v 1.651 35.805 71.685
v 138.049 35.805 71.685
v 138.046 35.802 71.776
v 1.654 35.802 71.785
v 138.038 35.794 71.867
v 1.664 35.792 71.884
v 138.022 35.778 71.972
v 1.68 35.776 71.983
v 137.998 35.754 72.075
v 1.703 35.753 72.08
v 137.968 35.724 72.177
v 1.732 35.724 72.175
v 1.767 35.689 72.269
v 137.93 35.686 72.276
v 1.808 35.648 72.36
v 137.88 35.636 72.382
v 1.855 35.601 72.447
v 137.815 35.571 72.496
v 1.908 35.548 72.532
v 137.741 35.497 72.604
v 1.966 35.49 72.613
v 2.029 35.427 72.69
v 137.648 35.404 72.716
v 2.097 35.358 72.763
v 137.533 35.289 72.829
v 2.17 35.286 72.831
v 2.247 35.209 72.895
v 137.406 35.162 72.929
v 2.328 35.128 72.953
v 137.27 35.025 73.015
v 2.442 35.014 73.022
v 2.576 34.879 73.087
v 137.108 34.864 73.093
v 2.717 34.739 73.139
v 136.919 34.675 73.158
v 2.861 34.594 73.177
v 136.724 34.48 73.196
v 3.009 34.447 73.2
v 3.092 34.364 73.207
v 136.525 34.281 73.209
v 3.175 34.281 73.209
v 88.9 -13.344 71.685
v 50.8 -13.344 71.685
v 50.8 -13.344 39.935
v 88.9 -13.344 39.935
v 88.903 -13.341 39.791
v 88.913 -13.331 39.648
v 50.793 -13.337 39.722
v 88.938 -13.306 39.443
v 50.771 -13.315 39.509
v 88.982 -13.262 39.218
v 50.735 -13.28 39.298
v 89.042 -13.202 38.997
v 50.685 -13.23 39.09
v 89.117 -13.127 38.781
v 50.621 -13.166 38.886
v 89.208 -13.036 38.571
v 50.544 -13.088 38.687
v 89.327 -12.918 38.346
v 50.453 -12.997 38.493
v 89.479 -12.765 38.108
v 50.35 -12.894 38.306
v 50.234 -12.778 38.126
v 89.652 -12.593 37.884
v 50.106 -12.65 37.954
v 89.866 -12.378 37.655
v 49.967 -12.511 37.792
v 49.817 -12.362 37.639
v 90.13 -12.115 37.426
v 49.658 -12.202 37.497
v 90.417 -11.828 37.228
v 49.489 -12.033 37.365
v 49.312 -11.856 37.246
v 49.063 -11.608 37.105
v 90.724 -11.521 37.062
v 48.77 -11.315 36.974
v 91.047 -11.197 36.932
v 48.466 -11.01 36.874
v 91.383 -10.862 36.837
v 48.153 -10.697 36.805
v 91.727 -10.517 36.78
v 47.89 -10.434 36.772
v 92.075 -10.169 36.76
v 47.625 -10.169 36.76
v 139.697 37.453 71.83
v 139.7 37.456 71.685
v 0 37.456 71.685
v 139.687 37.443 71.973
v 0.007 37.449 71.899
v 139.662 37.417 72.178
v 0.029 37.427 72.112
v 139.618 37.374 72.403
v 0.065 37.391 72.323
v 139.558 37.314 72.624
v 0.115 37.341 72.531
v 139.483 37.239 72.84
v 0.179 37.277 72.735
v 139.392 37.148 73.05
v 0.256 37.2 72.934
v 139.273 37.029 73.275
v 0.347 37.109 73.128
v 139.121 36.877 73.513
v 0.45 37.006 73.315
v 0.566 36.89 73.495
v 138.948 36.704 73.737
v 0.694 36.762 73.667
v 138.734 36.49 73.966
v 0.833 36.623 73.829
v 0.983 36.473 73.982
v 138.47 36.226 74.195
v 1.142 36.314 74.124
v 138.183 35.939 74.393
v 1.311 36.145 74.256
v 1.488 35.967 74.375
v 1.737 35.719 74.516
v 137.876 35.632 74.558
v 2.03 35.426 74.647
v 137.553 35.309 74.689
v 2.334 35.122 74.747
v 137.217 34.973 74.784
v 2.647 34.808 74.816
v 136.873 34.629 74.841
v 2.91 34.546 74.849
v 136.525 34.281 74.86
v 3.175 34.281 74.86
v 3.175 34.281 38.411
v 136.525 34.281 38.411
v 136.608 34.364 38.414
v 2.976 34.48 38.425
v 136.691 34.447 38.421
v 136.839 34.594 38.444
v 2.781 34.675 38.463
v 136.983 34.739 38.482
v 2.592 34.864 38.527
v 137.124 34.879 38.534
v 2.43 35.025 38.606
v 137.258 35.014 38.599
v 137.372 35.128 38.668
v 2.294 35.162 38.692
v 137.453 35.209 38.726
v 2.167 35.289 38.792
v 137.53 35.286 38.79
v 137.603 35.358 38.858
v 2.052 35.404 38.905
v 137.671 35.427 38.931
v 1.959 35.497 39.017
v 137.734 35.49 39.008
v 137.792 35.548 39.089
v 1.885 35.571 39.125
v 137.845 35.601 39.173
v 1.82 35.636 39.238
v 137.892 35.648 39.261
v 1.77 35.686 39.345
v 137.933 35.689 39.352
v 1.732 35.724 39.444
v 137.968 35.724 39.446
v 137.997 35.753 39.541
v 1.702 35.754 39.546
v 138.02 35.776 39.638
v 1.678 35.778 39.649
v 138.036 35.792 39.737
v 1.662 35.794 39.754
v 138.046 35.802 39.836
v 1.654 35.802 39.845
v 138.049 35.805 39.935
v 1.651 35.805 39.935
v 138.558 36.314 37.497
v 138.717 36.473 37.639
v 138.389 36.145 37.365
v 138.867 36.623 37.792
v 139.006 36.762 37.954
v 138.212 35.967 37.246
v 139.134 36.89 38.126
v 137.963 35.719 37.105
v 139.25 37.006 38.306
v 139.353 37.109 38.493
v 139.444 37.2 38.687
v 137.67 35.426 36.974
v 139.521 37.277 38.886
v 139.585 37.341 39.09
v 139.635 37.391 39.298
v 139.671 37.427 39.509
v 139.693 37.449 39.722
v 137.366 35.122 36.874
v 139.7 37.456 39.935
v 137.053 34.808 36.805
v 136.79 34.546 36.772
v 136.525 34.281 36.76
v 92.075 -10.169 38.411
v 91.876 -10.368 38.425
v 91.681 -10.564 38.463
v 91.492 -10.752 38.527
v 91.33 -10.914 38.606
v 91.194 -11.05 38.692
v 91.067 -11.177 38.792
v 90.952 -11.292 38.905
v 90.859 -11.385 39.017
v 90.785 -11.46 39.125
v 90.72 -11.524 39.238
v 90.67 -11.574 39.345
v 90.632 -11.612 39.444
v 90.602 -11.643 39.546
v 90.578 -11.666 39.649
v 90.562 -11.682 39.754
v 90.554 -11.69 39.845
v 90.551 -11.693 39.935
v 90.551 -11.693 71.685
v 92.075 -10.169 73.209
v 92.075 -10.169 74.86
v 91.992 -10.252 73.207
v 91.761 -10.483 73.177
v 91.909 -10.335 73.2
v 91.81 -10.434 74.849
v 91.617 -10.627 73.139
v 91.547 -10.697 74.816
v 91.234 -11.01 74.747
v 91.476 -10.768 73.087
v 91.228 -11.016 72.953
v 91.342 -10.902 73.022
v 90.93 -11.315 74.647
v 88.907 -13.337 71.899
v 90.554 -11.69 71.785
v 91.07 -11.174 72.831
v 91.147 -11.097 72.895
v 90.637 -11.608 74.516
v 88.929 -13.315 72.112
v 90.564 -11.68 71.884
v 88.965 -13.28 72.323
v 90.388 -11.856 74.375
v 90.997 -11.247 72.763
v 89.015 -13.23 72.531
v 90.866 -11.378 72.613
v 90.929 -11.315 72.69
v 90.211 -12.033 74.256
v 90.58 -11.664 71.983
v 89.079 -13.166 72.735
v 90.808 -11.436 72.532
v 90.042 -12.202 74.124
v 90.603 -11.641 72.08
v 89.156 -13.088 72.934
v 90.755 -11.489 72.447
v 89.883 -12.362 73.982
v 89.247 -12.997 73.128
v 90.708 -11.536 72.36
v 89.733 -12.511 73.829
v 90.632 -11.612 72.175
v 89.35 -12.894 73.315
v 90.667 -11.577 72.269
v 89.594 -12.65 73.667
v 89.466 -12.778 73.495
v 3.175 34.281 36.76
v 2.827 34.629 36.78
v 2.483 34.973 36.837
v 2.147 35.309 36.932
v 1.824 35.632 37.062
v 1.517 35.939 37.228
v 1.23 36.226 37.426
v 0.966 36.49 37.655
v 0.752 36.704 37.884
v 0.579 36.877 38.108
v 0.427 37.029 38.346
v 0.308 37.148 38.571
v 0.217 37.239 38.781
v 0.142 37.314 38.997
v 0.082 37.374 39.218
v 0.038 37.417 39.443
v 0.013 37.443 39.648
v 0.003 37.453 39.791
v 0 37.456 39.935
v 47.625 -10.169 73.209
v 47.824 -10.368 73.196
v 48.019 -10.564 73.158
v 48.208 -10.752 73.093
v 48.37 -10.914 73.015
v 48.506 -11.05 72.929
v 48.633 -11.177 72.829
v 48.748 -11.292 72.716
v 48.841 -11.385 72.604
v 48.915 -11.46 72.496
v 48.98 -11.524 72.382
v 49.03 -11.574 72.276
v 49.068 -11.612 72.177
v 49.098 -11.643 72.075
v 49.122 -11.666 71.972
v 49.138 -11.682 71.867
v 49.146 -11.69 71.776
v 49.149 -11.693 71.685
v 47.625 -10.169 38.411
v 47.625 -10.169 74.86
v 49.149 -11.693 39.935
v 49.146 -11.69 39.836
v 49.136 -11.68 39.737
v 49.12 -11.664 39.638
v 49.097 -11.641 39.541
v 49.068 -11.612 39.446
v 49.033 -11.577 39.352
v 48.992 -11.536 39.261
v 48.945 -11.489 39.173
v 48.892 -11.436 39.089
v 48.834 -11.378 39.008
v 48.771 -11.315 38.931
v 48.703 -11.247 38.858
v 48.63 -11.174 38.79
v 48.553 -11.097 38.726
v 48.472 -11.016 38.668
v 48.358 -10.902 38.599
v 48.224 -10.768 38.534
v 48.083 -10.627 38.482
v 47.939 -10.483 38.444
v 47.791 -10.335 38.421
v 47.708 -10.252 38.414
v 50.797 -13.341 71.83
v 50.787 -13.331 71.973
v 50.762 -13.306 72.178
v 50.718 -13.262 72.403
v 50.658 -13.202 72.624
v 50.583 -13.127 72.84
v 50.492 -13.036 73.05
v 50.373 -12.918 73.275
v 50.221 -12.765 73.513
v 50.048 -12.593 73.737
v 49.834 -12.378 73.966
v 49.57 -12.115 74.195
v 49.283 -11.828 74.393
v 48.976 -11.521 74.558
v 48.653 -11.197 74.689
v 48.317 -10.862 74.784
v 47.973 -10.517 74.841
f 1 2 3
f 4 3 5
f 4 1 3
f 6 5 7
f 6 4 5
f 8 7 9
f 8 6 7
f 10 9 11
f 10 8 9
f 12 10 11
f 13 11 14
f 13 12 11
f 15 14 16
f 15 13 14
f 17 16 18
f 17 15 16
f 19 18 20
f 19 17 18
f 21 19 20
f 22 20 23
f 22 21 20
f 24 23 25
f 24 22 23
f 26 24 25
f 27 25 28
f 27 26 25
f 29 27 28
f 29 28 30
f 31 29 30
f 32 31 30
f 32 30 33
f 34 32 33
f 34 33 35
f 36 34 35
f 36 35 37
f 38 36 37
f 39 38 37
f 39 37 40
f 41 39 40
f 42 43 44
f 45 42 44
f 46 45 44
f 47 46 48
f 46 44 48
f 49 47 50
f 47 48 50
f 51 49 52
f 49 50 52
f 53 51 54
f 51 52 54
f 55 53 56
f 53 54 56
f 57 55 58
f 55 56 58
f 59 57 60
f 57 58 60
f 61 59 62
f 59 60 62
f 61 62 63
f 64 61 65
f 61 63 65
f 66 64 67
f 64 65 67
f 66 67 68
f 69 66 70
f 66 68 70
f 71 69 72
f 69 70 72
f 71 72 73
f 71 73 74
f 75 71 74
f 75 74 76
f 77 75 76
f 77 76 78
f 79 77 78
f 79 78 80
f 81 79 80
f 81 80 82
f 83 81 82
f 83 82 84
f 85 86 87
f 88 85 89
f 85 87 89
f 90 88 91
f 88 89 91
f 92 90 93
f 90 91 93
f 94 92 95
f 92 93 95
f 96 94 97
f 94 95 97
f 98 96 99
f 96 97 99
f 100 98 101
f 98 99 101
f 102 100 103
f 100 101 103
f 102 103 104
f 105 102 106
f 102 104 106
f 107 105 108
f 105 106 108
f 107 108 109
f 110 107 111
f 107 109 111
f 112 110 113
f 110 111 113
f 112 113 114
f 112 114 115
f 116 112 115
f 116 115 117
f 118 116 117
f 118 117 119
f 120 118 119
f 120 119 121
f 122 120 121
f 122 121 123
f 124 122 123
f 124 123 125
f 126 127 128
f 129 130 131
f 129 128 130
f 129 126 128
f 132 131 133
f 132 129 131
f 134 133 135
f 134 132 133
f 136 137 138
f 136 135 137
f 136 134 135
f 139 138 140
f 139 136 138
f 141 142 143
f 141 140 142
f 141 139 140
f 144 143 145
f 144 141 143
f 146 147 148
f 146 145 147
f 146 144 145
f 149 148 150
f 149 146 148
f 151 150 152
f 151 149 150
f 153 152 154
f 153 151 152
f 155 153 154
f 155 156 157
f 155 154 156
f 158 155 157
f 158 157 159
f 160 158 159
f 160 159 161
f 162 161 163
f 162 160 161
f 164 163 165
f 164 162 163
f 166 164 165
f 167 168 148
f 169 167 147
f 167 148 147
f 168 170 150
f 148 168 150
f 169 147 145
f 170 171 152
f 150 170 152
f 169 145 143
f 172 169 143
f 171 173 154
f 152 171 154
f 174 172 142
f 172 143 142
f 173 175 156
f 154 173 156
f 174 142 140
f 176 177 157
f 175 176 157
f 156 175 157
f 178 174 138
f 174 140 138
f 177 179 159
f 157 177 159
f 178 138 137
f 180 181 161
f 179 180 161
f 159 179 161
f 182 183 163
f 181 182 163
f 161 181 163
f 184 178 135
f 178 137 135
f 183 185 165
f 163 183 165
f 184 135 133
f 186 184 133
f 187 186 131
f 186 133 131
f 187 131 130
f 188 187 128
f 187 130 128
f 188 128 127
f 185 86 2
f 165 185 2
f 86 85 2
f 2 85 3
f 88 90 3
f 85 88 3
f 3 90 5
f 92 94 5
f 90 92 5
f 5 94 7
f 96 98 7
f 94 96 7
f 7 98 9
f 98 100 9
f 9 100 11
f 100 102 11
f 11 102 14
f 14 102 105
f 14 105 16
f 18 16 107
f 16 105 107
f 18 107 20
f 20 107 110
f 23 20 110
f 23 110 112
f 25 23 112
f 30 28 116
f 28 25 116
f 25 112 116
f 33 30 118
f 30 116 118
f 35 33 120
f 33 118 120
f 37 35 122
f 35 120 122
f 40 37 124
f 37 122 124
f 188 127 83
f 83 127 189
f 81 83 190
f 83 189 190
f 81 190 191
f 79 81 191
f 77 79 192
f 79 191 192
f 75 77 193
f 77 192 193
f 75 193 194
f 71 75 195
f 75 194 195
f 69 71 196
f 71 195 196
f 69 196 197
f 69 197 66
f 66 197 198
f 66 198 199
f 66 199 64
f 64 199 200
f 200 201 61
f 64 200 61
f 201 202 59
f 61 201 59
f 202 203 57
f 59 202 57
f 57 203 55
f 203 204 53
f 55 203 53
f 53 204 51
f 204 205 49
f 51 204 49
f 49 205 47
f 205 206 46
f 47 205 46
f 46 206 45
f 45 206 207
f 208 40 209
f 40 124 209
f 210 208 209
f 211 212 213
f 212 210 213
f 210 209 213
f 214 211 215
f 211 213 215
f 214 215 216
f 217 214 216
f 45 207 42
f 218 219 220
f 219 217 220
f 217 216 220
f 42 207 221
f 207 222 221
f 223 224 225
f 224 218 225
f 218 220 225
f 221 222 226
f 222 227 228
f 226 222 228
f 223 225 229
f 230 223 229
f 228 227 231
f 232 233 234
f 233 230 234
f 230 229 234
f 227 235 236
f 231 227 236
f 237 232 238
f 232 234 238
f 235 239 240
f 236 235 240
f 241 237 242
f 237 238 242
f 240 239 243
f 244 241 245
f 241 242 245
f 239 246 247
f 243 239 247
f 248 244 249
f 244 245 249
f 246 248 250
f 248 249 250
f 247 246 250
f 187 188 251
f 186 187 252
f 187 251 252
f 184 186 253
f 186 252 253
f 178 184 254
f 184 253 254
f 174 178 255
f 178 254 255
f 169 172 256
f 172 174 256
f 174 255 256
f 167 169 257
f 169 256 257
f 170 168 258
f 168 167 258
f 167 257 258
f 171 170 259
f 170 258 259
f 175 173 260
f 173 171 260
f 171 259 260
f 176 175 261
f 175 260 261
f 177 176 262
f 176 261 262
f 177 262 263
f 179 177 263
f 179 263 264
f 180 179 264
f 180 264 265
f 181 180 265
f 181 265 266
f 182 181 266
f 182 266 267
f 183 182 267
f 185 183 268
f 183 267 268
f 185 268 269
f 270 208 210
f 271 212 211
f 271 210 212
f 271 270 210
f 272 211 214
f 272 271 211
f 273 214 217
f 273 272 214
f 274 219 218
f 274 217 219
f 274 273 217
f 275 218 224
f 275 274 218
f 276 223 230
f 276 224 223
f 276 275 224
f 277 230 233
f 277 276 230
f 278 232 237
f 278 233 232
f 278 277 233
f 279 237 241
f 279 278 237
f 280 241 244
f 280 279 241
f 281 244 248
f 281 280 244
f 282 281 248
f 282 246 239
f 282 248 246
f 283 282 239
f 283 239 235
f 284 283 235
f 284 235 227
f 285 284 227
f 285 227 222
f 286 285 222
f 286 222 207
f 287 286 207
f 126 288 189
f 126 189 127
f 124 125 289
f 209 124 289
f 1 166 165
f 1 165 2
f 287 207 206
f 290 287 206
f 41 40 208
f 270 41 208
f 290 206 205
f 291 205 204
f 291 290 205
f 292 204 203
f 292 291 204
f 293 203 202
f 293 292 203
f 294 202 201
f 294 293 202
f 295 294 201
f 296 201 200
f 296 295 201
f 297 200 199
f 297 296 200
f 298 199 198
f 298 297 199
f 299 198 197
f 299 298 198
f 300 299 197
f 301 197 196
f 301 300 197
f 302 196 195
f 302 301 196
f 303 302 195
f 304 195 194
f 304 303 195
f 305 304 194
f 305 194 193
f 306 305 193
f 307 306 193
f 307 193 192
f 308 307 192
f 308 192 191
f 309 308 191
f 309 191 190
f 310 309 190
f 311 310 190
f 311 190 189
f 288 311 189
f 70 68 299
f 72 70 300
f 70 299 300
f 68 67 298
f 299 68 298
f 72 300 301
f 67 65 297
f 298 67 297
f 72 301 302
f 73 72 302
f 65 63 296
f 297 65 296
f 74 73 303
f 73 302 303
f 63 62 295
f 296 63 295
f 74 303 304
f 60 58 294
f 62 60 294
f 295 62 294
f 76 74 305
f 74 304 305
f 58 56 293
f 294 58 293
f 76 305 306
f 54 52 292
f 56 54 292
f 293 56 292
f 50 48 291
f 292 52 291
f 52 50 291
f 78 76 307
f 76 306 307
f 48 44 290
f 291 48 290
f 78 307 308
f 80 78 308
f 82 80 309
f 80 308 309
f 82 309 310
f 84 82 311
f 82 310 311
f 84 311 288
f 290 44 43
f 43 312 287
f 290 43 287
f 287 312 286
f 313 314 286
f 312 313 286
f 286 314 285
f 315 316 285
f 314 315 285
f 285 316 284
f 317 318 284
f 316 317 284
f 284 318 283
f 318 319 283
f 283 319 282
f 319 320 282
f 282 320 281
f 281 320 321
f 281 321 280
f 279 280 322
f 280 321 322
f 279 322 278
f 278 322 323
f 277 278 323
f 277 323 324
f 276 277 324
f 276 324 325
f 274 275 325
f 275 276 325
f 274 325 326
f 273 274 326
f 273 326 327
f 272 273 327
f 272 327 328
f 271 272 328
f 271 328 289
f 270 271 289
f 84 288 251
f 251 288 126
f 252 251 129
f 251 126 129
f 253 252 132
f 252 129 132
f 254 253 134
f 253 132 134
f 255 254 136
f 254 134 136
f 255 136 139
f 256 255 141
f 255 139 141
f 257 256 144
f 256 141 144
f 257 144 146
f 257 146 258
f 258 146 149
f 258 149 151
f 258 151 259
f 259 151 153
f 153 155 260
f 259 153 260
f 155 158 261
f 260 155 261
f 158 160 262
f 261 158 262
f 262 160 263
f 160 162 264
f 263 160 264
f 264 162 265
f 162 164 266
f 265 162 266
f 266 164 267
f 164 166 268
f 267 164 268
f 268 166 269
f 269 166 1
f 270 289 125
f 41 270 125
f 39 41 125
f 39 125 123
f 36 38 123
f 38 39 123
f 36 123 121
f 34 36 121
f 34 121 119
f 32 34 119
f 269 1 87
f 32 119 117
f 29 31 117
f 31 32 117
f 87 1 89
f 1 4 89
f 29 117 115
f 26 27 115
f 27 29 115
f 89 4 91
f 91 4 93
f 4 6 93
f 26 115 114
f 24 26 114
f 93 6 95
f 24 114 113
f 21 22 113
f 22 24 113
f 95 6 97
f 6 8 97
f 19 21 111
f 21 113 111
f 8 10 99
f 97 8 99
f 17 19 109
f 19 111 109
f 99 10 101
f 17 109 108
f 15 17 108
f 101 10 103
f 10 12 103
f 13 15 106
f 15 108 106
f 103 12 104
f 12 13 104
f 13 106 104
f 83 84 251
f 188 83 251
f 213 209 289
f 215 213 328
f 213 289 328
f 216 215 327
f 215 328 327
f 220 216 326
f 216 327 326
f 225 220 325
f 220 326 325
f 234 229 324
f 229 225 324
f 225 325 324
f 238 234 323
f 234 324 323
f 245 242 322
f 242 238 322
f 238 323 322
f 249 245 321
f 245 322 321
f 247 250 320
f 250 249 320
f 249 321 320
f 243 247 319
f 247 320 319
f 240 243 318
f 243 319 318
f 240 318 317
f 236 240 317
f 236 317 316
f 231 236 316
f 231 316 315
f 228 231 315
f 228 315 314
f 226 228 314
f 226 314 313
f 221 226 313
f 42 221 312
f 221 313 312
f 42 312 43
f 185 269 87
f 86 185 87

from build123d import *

# Parameters (mm, degrees)
EXTRUDE_THIN2_DEPTH = 139.7
CUT_EXTRUDE1_DEPTH  = 150.568174674


with BuildPart() as part:
    # Sketch1 → Extrude-Thin2 (new body)
    with BuildSketch(Plane(origin=(0, 0, 0), x_dir=(0, 0, -1), z_dir=(1, 0, 0))):
        with BuildLine():
            Line((-39.935482404, 37.455825651), (-71.685482404, 37.455825651))
            ThreePointArc((-71.685482404, 37.455825651), (-73.930546435, 36.525889681), (-74.860482404, 34.280825651))
            Line((-74.860482404, 34.280825651), (-74.860482404, -10.169174349))
            ThreePointArc((-74.860482404, -10.169174349), (-73.930546435, -12.414238379), (-71.685482404, -13.344174349))
            Line((-71.685482404, -13.344174349), (-39.935482404, -13.344174349))
            ThreePointArc((-39.935482404, -13.344174349), (-37.690418374, -12.414238379), (-36.760482404, -10.169174349))
            Line((-36.760482404, -10.169174349), (-36.760482404, 34.280825651))
            ThreePointArc((-36.760482404, 34.280825651), (-37.690418374, 36.525889681), (-39.935482404, 37.455825651))
        make_face()
        with BuildLine():
            Line((-39.935482404, 35.804825651), (-71.685482404, 35.804825651))
            ThreePointArc((-71.685482404, 35.804825651), (-72.763113139, 35.358456386), (-73.209482404, 34.280825651))
            Line((-73.209482404, 34.280825651), (-73.209482404, -10.169174349))
            ThreePointArc((-73.209482404, -10.169174349), (-72.763113139, -11.246805083), (-71.685482404, -11.693174349))
            Line((-71.685482404, -11.693174349), (-39.935482404, -11.693174349))
            ThreePointArc((-39.935482404, -11.693174349), (-38.85785167, -11.246805083), (-38.411482404, -10.169174349))
            Line((-38.411482404, -10.169174349), (-38.411482404, 34.280825651))
            ThreePointArc((-38.411482404, 34.280825651), (-38.85785167, 35.358456386), (-39.935482404, 35.804825651))
        make_face(mode=Mode.SUBTRACT)
    extrude(amount=EXTRUDE_THIN2_DEPTH)

    # Sketch3 → Cut-Extrude1 (cut, through all)
    with BuildSketch(Plane.XY.offset(74.860482404)):
        Polygon((0, 37.455825651), (0, -38.744174349), (76.2, -38.744174349), align=None)
        Polygon((139.7, 37.455825651), (81.28, -20.964174349), (139.7, -20.964174349), align=None)
    extrude(amount=-CUT_EXTRUDE1_DEPTH, mode=Mode.SUBTRACT)


solid = part.part
